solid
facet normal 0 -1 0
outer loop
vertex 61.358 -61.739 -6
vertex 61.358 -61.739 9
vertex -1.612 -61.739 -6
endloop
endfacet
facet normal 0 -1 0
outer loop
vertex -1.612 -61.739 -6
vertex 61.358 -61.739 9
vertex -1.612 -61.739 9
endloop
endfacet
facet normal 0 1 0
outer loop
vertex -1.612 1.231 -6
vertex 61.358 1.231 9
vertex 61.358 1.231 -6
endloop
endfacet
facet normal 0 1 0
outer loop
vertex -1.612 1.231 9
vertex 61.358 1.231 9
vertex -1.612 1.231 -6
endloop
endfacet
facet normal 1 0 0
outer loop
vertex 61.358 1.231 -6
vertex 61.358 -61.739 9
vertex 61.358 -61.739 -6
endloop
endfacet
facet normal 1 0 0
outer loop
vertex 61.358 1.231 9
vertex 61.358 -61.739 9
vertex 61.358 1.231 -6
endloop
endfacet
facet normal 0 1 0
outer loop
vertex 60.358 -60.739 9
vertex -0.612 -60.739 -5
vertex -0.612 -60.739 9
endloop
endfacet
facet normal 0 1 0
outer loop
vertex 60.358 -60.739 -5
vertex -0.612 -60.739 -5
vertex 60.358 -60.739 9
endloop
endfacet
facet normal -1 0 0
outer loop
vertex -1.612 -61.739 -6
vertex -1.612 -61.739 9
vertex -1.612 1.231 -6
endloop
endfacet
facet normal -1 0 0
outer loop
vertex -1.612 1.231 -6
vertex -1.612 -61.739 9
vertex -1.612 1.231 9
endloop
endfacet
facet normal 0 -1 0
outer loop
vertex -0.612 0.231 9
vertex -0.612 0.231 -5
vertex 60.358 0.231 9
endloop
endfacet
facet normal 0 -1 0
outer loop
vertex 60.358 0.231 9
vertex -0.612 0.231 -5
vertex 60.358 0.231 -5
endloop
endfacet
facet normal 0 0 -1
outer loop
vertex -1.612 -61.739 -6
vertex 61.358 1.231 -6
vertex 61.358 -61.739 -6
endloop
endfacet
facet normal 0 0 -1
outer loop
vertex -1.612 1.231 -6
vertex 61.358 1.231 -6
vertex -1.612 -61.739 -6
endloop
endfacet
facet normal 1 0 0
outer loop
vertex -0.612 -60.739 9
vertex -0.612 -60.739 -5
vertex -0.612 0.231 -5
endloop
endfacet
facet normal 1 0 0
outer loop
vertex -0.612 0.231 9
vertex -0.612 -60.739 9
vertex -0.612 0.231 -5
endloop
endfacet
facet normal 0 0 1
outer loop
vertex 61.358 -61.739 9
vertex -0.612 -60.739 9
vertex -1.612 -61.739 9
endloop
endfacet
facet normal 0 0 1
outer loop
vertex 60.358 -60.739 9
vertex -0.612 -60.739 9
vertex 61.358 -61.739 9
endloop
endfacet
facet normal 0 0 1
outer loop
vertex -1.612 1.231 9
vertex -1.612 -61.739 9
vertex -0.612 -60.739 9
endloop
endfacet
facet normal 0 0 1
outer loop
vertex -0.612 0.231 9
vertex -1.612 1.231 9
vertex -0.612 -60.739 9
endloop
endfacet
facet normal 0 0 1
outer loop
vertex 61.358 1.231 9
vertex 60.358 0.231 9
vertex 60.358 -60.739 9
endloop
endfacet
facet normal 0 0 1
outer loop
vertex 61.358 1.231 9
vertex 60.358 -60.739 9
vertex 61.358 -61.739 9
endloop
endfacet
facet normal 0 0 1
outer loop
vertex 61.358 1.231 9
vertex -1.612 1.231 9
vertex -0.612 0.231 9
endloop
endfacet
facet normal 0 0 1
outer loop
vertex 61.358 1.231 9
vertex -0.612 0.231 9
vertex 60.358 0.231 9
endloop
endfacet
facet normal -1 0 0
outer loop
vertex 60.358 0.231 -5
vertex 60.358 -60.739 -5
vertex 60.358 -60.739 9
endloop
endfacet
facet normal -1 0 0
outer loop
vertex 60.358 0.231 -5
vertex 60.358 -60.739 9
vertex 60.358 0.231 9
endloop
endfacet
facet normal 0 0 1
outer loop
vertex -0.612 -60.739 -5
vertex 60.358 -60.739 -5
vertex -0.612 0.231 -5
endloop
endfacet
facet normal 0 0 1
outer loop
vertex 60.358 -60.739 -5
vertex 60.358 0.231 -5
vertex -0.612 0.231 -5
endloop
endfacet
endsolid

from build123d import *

# Parameters (mm, degrees)
EXTRUDE_START     = -5
SKETCH_1_W        = 62.97
SKETCH_1_H        = 62.97
SKETCH_1_W_2      = 60.97
SKETCH_1_H_2      = 60.97
EXTRUDE_1_DEPTH   = 14
SKETCH_3_W        = 62.97
SKETCH_3_H        = 62.97
EXTRUDE_1_2_DEPTH = 1


with BuildPart() as part:
    # 草图1 → Extrude 1 (new body)
    with BuildSketch(Plane.XY.offset(EXTRUDE_START)):
        with Locations((29.873059436, -30.254060198)):
            Rectangle(SKETCH_1_W, SKETCH_1_H)
        with Locations((29.873059436, -30.254060198)):
            Rectangle(SKETCH_1_W_2, SKETCH_1_H_2, mode=Mode.SUBTRACT)
    extrude(amount=EXTRUDE_1_DEPTH)

    # 草图3 → Extrude 1 2 (add)
    with BuildSketch(Plane(origin=(0, 0, -5), x_dir=(-1, 0, 0), z_dir=(0, 0, -1))):
        with Locations((-29.873059436, -30.254060198)):
            Rectangle(SKETCH_3_W, SKETCH_3_H)
    extrude(amount=EXTRUDE_1_2_DEPTH)


solid = part.part
